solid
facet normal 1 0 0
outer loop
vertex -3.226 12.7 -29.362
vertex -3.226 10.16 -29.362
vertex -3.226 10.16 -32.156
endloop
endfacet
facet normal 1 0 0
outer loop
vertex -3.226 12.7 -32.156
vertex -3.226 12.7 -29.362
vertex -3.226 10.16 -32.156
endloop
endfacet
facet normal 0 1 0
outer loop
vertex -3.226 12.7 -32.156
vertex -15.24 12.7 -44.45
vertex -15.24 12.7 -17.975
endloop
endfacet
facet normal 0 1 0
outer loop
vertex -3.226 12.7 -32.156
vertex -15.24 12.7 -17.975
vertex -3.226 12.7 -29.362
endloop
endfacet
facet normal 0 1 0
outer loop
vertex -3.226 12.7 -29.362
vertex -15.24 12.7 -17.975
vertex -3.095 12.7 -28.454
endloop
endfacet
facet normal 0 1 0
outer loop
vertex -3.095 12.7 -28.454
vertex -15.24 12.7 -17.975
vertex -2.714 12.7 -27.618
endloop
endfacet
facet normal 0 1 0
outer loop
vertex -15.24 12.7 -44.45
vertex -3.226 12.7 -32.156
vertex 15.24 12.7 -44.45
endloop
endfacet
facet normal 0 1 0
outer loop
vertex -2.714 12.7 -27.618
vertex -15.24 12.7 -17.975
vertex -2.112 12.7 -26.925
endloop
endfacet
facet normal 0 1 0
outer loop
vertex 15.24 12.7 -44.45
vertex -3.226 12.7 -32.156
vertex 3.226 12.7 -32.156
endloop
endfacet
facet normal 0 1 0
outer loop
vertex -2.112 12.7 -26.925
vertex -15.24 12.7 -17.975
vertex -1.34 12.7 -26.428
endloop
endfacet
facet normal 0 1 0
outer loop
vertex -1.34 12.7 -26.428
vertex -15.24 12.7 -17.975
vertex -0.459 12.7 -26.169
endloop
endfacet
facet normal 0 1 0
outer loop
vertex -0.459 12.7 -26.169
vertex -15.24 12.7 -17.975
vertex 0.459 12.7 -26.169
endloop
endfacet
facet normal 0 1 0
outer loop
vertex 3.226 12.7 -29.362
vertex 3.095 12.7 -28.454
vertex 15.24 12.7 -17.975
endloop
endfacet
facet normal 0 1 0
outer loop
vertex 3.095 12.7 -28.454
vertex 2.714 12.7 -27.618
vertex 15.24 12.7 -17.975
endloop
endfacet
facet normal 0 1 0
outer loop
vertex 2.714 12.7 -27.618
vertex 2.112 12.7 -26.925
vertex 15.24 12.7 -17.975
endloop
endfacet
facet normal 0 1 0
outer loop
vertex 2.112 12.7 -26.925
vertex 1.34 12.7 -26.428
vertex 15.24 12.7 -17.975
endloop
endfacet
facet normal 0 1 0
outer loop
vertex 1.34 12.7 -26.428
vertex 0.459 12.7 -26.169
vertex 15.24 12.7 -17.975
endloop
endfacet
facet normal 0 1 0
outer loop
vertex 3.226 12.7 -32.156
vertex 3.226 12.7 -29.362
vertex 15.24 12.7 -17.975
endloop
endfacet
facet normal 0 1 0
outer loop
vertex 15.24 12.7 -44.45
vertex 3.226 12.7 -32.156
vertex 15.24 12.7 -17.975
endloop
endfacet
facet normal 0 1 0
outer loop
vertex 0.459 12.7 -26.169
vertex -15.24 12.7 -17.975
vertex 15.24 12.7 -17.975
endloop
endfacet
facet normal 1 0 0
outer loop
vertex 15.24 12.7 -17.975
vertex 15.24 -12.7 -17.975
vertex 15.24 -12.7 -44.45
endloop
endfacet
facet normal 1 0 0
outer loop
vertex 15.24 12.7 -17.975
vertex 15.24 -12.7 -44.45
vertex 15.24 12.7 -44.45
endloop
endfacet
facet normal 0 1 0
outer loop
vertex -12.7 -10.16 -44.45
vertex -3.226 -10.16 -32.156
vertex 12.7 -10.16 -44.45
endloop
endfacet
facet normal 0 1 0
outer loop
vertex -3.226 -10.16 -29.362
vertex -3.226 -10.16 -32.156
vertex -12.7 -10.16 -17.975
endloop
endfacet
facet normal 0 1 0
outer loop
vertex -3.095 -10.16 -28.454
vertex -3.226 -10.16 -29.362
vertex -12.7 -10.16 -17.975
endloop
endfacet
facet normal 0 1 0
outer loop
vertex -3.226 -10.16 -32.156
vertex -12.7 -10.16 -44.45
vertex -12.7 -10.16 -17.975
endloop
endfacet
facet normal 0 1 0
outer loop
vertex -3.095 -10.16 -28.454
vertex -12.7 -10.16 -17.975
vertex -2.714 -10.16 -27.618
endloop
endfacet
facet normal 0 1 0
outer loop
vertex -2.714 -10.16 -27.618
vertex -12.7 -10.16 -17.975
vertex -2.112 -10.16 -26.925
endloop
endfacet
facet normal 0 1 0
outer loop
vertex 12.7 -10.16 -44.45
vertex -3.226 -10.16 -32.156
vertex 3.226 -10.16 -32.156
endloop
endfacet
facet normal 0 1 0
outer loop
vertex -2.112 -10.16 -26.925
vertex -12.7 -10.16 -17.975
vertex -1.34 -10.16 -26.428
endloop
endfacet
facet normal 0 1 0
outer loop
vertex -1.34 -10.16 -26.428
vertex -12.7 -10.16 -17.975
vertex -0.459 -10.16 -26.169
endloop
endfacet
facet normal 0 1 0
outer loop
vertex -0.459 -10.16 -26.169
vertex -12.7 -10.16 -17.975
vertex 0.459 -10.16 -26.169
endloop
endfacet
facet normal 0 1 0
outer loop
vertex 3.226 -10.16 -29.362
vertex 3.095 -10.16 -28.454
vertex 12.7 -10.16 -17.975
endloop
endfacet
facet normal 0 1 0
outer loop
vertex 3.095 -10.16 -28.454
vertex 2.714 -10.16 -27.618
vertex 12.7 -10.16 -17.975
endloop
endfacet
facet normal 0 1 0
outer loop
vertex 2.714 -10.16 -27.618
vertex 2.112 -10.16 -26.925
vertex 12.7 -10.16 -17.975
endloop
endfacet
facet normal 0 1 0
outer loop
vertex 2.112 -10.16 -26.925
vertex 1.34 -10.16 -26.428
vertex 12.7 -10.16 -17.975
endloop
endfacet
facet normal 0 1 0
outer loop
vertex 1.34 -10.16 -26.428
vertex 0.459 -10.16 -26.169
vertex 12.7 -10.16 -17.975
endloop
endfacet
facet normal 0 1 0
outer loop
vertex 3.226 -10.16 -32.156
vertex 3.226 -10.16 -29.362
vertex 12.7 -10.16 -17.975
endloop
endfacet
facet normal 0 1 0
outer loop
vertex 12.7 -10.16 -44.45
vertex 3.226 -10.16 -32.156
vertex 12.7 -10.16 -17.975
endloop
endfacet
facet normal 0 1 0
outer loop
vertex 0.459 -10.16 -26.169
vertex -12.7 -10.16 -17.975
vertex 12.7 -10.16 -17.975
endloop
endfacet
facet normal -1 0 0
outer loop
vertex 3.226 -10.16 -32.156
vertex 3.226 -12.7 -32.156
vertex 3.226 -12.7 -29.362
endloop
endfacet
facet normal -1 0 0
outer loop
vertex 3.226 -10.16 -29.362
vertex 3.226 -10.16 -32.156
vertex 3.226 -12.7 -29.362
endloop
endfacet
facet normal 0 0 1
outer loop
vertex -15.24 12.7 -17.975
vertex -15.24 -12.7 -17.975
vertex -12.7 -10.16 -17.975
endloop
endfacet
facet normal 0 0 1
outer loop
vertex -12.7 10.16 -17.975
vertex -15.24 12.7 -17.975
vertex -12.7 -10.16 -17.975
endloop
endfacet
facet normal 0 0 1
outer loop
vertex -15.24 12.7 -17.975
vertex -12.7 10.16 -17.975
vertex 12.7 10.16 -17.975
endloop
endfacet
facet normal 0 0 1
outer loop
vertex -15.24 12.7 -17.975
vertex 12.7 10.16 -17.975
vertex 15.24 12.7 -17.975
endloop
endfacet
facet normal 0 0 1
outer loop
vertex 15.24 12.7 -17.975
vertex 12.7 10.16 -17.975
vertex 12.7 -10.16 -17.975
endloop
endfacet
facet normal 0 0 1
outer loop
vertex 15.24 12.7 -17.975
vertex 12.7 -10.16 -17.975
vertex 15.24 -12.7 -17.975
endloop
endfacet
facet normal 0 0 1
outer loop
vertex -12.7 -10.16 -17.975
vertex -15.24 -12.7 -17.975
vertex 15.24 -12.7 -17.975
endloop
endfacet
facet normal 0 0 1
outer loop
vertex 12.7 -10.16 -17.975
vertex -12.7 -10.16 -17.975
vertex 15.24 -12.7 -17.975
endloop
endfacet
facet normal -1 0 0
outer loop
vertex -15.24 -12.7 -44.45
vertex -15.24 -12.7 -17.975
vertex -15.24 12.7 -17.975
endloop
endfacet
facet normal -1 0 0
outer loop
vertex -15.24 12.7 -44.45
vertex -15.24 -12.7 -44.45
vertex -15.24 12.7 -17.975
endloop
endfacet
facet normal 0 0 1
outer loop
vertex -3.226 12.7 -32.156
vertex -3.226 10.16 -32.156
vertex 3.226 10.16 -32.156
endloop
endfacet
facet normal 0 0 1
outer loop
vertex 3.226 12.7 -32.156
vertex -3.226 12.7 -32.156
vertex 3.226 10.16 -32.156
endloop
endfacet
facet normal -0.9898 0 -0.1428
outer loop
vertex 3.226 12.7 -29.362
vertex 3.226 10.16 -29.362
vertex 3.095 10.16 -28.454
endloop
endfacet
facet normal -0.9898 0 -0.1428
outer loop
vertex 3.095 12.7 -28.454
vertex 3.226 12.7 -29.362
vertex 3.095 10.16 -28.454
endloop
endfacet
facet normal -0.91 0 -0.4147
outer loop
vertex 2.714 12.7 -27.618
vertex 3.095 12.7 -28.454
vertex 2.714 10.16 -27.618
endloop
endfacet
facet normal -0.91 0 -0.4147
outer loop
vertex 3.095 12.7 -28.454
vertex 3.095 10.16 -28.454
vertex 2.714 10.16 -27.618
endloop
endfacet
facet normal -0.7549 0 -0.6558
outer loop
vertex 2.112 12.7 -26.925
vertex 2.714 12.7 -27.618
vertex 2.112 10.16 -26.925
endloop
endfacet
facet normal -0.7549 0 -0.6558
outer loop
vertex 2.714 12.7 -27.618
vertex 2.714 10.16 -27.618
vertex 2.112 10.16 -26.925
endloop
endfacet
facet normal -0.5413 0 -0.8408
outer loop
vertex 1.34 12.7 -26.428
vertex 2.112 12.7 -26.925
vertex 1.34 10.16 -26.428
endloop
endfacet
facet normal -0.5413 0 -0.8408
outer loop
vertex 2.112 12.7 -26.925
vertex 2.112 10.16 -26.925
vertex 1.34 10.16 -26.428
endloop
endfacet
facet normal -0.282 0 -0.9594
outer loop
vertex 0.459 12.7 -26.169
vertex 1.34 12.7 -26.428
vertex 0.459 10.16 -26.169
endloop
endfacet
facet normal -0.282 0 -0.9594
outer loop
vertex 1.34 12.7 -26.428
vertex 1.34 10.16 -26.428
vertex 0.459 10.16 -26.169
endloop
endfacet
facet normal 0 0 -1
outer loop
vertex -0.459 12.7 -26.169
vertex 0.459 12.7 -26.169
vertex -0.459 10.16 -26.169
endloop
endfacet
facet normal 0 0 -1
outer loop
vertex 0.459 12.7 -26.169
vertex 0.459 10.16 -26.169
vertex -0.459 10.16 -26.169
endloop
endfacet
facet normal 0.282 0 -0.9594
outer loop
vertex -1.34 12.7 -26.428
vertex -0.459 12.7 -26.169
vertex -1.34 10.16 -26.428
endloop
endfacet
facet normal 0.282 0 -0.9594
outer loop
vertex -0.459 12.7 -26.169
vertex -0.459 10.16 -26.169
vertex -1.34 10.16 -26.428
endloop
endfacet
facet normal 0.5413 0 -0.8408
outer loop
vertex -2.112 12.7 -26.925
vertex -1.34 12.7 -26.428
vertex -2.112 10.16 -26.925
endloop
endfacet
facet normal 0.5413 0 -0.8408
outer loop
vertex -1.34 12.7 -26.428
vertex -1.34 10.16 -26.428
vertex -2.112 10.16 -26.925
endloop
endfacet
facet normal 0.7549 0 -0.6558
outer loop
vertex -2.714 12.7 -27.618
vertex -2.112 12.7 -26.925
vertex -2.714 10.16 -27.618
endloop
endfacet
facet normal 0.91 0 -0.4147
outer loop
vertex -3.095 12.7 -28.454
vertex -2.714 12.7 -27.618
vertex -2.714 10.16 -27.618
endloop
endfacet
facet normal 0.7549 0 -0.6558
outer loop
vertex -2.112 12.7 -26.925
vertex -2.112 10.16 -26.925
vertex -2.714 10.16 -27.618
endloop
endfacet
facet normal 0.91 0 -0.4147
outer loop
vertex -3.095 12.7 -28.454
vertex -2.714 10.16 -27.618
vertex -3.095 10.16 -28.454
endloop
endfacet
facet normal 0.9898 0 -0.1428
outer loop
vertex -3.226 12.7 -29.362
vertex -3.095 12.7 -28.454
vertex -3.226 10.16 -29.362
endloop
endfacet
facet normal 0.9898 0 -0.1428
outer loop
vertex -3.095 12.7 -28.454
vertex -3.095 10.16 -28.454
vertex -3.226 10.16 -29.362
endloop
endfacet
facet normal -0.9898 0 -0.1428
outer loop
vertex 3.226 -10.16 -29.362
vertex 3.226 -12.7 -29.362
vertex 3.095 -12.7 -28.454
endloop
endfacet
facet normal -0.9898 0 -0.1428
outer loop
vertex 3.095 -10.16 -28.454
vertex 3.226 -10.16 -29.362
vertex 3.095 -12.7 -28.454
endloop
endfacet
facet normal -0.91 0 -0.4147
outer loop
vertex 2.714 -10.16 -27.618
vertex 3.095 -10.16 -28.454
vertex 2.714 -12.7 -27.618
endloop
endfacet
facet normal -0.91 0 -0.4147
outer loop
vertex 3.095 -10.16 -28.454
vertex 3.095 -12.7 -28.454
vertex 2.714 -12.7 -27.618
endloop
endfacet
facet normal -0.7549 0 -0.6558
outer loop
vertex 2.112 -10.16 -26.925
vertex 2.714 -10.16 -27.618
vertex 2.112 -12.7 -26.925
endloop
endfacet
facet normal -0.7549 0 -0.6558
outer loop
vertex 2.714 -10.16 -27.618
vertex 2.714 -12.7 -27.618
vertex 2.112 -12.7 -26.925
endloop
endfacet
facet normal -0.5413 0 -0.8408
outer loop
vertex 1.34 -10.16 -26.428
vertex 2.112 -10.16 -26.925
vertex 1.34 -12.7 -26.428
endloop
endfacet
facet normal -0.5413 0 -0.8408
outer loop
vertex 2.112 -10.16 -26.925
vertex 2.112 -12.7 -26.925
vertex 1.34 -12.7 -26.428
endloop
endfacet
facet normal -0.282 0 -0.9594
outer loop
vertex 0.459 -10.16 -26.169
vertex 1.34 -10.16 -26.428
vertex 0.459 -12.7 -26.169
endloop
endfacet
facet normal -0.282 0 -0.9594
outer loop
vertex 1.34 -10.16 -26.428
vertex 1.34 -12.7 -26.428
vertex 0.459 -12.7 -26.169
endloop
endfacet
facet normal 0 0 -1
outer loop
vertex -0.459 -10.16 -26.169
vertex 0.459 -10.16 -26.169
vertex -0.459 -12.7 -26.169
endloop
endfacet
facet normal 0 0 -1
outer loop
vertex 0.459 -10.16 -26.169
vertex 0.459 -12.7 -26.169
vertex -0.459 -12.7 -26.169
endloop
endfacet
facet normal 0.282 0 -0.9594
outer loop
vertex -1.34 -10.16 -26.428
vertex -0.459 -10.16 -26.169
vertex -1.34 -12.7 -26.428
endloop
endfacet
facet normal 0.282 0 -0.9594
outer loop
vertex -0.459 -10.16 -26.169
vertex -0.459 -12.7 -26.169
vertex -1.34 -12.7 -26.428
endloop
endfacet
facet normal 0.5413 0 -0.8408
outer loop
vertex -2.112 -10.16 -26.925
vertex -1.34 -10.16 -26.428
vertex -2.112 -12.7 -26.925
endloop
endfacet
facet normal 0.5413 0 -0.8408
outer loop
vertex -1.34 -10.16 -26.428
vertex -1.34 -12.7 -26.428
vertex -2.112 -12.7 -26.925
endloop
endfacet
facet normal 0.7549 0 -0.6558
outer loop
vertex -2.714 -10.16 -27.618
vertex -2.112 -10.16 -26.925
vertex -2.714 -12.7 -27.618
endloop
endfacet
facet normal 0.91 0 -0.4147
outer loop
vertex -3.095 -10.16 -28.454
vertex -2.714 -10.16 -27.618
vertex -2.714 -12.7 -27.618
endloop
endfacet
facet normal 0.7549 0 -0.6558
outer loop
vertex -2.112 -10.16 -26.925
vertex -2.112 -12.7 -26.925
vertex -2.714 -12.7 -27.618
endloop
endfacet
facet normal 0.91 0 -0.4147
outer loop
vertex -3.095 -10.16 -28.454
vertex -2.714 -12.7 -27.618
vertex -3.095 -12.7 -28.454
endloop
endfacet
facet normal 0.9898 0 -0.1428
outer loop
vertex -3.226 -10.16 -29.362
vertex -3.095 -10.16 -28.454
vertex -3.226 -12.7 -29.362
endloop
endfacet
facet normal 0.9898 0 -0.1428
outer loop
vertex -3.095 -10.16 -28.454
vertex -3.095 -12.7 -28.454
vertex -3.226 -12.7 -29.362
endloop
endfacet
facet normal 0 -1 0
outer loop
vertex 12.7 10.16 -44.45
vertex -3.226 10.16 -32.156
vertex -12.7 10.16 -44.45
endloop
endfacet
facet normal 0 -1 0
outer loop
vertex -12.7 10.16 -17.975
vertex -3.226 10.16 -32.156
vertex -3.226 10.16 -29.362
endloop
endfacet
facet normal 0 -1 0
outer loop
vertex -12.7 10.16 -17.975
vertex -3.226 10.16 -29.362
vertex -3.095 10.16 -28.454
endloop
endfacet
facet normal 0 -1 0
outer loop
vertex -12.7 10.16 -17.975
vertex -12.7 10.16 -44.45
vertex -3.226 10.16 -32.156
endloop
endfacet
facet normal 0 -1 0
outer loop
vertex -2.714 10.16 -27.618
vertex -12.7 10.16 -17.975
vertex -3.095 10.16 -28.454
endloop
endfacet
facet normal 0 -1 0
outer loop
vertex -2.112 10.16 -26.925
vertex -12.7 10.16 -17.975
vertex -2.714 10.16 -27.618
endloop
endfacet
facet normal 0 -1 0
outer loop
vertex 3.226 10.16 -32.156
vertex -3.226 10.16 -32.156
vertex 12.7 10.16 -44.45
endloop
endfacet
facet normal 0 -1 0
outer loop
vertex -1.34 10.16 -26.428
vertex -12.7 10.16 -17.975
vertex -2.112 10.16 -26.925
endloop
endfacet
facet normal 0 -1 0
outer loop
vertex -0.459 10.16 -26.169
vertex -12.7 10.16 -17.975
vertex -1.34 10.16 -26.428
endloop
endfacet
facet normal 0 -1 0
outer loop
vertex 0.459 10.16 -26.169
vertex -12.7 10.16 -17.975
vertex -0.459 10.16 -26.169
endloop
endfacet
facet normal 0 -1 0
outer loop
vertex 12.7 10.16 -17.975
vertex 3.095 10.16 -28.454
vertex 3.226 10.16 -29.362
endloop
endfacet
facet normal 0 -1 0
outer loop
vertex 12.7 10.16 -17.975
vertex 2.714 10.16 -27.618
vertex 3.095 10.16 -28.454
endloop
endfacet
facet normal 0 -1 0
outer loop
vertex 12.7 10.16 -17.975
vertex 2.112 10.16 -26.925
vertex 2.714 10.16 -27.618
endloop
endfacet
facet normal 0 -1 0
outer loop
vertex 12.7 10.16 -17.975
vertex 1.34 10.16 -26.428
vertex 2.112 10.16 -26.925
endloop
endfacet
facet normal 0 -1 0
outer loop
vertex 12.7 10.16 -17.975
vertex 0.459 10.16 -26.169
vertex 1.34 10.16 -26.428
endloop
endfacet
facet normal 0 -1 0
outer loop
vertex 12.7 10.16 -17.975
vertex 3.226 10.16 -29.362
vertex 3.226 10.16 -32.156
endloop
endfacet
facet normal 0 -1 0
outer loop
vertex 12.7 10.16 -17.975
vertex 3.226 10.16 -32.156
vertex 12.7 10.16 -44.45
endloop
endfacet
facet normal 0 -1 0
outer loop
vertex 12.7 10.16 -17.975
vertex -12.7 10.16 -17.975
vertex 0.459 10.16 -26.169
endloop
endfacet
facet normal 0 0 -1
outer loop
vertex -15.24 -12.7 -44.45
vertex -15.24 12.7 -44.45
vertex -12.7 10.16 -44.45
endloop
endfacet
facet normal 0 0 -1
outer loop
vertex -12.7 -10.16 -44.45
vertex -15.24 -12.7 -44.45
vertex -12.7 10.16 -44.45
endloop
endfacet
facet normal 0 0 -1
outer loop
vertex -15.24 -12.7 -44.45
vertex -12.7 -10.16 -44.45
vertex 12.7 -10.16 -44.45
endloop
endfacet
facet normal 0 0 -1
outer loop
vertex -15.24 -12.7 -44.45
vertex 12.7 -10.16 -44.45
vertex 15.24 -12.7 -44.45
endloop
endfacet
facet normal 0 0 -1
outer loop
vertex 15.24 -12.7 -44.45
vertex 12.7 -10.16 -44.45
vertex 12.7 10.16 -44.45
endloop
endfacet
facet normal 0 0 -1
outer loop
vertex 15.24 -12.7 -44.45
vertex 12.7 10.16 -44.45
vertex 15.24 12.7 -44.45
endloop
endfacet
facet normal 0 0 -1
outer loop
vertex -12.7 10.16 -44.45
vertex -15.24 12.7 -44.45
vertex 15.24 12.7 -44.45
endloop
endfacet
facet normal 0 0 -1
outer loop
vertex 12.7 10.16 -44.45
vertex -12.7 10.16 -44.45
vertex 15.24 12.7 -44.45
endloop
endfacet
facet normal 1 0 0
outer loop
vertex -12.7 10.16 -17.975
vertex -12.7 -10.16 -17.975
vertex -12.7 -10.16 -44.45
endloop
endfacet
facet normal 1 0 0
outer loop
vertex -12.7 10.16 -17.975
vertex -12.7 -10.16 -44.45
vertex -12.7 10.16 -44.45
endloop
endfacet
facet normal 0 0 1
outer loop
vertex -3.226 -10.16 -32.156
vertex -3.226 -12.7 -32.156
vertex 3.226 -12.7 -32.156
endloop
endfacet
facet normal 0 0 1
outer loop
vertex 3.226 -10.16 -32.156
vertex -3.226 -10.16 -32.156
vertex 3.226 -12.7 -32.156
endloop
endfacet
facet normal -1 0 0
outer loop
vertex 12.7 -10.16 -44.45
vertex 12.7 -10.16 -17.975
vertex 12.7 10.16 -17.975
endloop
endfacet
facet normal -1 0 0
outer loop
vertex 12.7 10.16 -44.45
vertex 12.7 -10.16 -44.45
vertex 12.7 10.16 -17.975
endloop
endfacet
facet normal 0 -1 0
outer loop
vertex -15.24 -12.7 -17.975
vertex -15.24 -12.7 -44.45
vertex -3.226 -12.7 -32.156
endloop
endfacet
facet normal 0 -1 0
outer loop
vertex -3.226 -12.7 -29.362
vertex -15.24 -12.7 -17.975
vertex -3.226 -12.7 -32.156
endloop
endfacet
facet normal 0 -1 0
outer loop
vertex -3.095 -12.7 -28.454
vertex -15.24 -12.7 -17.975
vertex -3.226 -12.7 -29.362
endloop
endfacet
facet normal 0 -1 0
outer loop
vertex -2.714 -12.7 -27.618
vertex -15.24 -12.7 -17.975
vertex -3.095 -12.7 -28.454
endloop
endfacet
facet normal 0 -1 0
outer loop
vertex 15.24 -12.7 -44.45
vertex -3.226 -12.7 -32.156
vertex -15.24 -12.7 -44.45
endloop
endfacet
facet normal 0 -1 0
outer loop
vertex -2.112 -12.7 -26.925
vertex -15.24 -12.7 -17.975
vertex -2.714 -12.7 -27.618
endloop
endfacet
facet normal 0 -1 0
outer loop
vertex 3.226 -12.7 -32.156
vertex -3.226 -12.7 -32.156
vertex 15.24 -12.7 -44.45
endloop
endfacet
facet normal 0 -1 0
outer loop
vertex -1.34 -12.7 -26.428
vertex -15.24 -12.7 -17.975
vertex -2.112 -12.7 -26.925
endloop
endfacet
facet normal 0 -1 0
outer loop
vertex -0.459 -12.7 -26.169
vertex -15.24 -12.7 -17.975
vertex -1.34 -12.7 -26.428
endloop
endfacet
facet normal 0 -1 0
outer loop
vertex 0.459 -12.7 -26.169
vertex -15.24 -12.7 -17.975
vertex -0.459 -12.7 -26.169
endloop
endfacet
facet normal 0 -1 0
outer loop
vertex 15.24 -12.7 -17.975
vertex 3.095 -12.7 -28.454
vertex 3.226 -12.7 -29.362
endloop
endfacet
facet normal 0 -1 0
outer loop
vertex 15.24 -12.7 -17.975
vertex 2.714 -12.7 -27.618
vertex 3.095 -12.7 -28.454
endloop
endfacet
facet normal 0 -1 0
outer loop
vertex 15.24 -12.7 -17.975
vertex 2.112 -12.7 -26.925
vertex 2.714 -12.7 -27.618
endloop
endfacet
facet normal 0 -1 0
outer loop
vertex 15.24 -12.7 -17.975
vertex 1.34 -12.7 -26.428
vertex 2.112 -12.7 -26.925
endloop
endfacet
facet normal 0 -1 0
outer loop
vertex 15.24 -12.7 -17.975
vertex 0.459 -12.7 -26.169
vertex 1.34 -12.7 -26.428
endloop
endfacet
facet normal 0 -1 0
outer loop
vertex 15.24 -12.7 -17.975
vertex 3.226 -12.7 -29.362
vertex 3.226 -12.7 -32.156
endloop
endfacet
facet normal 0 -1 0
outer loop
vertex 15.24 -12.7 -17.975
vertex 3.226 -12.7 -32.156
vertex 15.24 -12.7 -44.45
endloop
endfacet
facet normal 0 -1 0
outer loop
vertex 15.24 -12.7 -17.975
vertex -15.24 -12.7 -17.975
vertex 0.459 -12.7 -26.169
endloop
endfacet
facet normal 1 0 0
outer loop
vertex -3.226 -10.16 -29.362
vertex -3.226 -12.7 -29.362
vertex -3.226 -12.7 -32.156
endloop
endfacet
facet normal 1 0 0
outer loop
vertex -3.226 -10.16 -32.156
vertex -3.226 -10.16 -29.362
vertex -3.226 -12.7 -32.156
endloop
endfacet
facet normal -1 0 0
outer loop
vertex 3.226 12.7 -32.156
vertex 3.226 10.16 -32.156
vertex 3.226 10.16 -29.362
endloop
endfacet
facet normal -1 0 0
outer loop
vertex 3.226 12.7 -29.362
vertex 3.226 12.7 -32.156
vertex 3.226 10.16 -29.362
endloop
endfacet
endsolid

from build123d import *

# Parameters (mm, degrees)
F0_W     = 30.48
F0_H     = 25.4
F0_W_2   = 25.4
F0_H_2   = 20.32
F1_DEPTH = 44.45
F2_W     = 25.4
F2_H     = 20.32
F2_W_2   = 20.32
F2_H_2   = 15.24
F2_R     = 2.159
F3_DEPTH = 25.4
F4_R     = 2.159
F5_DEPTH = 5.08
F6_R     = 3.429
F6_W     = 8.128
F6_H     = 3.048
F7_DEPTH = 25.4
F8_W     = 54.200325
F8_H     = 68.948708
F9_DEPTH = 12.7


with BuildPart() as f1:
    # F0 (on Top) → F1 (new body, symmetric)
    with BuildSketch(Plane.XY):
        Rectangle(F0_W, F0_H)
        Rectangle(F0_W_2, F0_H_2, mode=Mode.SUBTRACT)
    extrude(amount=F1_DEPTH, both=True)

    # F2 (on face) → F3 (join)
    with BuildSketch(Plane.XY.offset(44.45)):
        Rectangle(F2_W, F2_H)
        Rectangle(F2_W_2, F2_H_2, mode=Mode.SUBTRACT)
        Rectangle(F2_W_2, F2_H_2)
        with Locations((-6.35, 0)):
            Circle(F2_R, mode=Mode.SUBTRACT)
        with Locations((6.35, 0)):
            Circle(F2_R, mode=Mode.SUBTRACT)
    extrude(amount=-F3_DEPTH)

    # F4 (on face) → F5 (cut)
    with BuildSketch(Plane(origin=(0, 0, 19.05), x_dir=(1, 0, 0), z_dir=(0, 0, -1))):
        with Locations((6.35, 0)):
            Circle(F4_R)
        with Locations((-6.35, 0)):
            Circle(F4_R)
    extrude(amount=-F5_DEPTH, mode=Mode.SUBTRACT)

    # F6 (on face) → F7 (cut)
    with BuildSketch(Plane.XZ.offset(12.7)):
        with Locations((0, 8.001)):
            Circle(F6_R)
        with Locations((0, -8.4074)):
            Rectangle(F6_W, F6_H)
        with BuildLine():
            Line((-3.2258, -29.3624), (-3.2258, -32.1564))
            Line((-3.2258, -32.1564), (3.2258, -32.1564))
            Line((3.2258, -32.1564), (3.2258, -29.3624))
            ThreePointArc((3.2258, -29.3624), (0, -26.1366), (-3.2258, -29.3624))
        make_face()
    extrude(amount=-F7_DEPTH, mode=Mode.SUBTRACT)

    # F8 (on Front) → F9 (cut, symmetric)
    with BuildSketch(Plane.XZ):
        with Locations((2.120081, 16.499758)):
            Rectangle(F8_W, F8_H)
    extrude(amount=F9_DEPTH, both=True, mode=Mode.SUBTRACT)


solid = f1.part
